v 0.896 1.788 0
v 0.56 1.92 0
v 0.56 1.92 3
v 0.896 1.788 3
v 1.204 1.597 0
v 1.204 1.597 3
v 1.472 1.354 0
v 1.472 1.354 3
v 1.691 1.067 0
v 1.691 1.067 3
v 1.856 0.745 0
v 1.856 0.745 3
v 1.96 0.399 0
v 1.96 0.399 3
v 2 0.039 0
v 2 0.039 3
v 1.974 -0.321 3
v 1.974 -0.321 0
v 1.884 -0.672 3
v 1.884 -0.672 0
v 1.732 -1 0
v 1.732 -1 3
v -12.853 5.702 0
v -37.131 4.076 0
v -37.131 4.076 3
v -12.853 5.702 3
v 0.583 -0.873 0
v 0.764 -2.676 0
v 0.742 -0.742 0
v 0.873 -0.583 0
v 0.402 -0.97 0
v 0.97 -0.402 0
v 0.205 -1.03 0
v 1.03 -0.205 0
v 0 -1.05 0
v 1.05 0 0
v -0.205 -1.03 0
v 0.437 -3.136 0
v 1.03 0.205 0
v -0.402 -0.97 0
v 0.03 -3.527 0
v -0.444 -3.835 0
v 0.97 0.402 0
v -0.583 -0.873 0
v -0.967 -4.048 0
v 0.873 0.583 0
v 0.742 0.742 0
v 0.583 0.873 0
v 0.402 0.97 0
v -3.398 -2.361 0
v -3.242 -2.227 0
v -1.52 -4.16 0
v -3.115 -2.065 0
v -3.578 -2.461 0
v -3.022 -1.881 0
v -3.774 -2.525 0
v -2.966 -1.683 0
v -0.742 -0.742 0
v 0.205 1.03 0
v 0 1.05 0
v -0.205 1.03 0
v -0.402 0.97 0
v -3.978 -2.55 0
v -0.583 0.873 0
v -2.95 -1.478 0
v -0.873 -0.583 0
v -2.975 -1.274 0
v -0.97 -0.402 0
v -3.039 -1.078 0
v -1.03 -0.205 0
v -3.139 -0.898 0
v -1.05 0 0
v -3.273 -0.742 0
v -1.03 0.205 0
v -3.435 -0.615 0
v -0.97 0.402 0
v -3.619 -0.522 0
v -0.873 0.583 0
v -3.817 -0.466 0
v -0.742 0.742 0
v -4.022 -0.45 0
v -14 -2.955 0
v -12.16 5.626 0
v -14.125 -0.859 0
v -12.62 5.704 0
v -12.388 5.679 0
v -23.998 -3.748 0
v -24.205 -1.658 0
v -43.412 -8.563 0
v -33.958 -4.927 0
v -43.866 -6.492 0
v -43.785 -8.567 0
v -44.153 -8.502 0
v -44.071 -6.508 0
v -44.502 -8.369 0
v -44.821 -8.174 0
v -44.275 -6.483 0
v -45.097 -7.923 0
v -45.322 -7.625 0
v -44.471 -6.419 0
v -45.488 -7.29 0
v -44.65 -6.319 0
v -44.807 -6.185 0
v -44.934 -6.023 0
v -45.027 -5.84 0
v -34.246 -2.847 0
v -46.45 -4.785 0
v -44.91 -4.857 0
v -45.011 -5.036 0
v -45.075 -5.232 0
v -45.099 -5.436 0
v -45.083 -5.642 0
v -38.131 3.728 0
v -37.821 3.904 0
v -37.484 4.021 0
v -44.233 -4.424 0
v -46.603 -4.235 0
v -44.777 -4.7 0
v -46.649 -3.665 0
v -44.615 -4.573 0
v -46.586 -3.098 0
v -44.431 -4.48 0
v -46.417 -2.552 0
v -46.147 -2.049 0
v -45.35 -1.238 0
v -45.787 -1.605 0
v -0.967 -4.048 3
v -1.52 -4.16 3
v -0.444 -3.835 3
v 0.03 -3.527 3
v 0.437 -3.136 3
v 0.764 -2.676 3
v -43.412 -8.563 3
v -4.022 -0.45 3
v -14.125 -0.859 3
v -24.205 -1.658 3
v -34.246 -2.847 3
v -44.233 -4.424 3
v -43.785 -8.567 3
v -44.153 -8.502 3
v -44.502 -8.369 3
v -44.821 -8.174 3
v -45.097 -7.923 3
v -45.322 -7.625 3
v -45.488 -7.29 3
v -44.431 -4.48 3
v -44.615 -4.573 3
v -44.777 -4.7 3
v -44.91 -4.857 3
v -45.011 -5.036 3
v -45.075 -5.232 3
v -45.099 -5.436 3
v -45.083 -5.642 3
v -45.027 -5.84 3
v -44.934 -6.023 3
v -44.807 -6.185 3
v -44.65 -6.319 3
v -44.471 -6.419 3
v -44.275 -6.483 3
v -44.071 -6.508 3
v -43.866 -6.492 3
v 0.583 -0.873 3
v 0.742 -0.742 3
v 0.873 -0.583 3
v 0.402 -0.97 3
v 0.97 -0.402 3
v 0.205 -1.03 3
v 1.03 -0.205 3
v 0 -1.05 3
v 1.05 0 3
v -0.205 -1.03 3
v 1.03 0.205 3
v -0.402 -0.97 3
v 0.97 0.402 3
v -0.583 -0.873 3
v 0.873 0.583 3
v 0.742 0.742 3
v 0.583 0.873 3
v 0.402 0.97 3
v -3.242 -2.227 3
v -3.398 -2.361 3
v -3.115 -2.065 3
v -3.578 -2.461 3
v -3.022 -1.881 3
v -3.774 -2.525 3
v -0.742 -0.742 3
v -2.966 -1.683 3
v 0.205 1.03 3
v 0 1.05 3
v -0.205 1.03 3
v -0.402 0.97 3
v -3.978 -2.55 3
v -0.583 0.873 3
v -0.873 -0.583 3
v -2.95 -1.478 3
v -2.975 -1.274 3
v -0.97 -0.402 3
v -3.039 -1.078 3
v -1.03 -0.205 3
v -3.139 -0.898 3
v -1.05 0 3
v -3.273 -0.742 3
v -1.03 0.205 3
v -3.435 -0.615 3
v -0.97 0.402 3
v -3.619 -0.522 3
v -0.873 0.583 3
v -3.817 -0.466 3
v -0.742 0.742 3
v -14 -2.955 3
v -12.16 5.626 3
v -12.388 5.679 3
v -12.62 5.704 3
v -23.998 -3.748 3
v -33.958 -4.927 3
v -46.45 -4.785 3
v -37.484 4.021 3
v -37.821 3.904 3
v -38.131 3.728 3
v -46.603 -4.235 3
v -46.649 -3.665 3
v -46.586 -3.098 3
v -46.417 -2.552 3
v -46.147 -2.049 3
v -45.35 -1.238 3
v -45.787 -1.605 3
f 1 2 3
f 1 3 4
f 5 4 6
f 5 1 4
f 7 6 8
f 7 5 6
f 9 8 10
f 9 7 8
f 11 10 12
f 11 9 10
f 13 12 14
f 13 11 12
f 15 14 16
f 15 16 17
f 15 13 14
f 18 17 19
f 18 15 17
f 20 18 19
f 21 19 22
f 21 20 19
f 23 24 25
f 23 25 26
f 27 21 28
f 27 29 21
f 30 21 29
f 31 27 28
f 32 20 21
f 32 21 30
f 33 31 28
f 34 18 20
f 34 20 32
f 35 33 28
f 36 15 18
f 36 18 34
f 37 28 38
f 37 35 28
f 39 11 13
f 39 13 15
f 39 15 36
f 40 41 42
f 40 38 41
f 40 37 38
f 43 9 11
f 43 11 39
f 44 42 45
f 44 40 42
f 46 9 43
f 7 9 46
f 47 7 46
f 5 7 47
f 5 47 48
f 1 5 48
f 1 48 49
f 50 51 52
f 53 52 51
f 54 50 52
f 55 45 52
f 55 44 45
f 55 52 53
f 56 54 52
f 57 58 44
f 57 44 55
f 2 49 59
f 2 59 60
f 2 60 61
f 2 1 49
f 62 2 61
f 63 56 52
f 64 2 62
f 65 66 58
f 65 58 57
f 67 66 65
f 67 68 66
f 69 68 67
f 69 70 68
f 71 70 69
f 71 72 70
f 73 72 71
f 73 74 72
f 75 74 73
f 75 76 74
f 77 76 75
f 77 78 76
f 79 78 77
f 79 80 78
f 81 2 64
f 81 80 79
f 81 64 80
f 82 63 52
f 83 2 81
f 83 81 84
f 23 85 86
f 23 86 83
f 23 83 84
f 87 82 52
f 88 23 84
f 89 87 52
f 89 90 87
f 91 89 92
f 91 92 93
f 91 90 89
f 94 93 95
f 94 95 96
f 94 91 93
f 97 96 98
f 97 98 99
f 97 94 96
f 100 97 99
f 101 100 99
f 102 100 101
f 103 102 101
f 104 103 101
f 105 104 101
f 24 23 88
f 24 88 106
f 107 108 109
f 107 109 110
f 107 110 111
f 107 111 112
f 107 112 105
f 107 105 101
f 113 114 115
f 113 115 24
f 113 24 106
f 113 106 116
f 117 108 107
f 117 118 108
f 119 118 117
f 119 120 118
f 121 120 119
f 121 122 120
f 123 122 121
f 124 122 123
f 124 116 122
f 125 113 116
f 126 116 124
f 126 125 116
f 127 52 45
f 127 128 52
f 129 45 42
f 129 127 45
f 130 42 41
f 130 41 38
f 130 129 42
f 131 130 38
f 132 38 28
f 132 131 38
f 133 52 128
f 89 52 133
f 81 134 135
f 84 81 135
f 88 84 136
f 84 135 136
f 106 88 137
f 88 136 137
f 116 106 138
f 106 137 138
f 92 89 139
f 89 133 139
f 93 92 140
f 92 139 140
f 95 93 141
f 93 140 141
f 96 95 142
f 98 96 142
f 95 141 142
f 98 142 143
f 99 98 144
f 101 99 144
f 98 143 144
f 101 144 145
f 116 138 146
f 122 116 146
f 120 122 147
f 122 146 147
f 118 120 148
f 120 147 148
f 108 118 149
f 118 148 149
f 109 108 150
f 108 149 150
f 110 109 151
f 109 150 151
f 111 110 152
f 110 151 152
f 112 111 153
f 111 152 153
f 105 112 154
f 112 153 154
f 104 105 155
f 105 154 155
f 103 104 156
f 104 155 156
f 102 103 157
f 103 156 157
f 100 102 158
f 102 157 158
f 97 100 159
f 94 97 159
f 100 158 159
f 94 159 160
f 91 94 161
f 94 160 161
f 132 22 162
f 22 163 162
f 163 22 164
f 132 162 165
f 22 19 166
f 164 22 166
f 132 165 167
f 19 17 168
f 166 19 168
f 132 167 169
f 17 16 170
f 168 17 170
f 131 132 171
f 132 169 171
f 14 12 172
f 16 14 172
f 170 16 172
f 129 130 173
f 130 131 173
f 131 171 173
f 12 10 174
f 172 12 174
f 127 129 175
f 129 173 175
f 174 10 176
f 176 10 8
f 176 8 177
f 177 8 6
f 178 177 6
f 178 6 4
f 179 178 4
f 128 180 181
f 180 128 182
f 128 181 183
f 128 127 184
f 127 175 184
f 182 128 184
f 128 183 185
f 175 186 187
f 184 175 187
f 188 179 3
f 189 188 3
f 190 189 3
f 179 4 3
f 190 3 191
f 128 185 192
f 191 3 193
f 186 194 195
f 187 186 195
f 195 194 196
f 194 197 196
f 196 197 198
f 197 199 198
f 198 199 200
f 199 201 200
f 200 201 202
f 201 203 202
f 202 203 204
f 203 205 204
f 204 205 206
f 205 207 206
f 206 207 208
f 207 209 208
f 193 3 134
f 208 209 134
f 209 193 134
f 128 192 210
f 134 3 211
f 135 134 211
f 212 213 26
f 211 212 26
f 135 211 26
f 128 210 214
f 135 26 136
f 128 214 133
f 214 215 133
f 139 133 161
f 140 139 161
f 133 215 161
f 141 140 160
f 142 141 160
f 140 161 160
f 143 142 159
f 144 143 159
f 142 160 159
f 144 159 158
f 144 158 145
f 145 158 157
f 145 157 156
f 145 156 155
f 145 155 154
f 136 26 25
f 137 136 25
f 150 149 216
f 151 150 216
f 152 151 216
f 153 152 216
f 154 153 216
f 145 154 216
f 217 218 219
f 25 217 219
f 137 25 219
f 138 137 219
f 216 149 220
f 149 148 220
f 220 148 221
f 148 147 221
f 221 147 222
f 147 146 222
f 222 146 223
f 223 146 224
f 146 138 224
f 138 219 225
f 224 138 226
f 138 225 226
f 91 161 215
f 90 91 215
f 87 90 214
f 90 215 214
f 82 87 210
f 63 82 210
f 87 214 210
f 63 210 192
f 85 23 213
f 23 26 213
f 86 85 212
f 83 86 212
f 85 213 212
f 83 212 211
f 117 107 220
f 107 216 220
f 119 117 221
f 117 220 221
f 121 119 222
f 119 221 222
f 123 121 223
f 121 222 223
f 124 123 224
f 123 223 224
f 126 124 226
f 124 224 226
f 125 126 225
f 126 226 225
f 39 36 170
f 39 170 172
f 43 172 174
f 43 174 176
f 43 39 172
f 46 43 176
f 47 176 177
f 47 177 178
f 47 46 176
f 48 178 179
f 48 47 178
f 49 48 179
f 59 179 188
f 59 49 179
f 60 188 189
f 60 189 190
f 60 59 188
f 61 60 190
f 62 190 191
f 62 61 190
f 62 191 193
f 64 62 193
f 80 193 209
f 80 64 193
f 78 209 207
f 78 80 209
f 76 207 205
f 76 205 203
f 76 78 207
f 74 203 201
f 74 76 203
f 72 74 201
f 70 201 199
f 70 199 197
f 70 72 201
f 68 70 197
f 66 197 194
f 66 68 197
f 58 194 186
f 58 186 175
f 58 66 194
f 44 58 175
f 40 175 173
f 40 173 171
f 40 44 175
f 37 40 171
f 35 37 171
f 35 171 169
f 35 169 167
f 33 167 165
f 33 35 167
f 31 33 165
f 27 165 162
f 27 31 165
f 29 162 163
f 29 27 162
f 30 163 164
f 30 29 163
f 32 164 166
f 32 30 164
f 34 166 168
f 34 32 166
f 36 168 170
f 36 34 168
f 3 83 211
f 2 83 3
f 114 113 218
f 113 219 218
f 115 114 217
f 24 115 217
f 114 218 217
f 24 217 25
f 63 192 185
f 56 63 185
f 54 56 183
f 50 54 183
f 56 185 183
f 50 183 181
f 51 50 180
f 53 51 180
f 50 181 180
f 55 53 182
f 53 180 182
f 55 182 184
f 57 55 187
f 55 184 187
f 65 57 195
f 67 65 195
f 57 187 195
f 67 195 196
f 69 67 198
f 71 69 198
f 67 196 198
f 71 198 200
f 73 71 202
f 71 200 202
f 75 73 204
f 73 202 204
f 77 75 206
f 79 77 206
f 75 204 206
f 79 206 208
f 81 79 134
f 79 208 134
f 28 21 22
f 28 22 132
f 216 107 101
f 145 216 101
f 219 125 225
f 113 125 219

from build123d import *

# Parameters (mm, degrees)
SKETCH_1_R                 = 1.05
EXTRUDE_1_DEPTH            = 3
CUT_EXTRUDE_1_DEPTH        = 3
EXTRUDE_2_DEPTH            = 3
CUT_EXTRUDE_1_2_DEPTH      = 53.507202205
CUT_EXTRUDE_1_2_DEPTH_BACK = 3
FILLET_1_R                 = 2
FILLET_2_R                 = 3
FILLET_3_R                 = 3
FILLET_4_R                 = 2


with BuildPart() as part:
    # 草图1 → 凸台-拉伸1 (new body)
    with BuildSketch(Plane.XY):
        with BuildLine():
            Line((-49.8, -9.234190916), (-51.601705413, -5.540147386))
            Line((-51.601705413, -5.540147386), (-37.679104802, 4.039580805))
            Line((-37.679104802, 4.039580805), (-12.5, 5.72552912))
            Line((-12.5, 5.72552912), (0.559507092, 1.920143696))
            ThreePointArc((0.559507092, 1.920143696), (1.855968535, 0.745238752), (1.732050808, -1))
            Line((1.732050808, -1), (0, -4))
            Line((0, -4), (-49.8, -9.234190916))
        make_face()
        Circle(SKETCH_1_R, mode=Mode.SUBTRACT)
    extrude(amount=EXTRUDE_1_DEPTH)

    # 草图3 → Cut-Extrude 1 (cut)
    with BuildSketch(Plane.XY.offset(3)):
        with BuildLine():
            ThreePointArc((-4.02208158, -0.450232214), (-25.702985996, -1.810356042), (-47.195735426, -4.968405291))
            ThreePointArc((-47.195735426, -4.968405291), (-48.031594709, -6.195735426), (-46.804264574, -7.031594709))
            ThreePointArc((-46.804264574, -7.031594709), (-25.48441219, -3.898950185), (-3.97791842, -2.549767786))
            ThreePointArc((-3.97791842, -2.549767786), (-2.950232214, -1.47791842), (-4.02208158, -0.450232214))
        make_face()
    extrude(amount=-CUT_EXTRUDE_1_DEPTH, mode=Mode.SUBTRACT)

    # 草图5 → 凸台-拉伸2 (add)
    with BuildSketch(Plane.XY.offset(3)):
        with BuildLine():
            ThreePointArc((-44.233228768, -4.423985056), (-45.083193675, -5.64158912), (-43.865589611, -6.491554028))
            ThreePointArc((-43.865589611, -6.491554028), (-45.335706004, -6.757335859), (-46.804264574, -7.031594709))
            ThreePointArc((-46.804264574, -7.031594709), (-48.031594709, -6.195735426), (-47.195735426, -4.968405291))
            ThreePointArc((-47.195735426, -4.968405291), (-45.715267325, -4.691922292), (-44.233228768, -4.423985056))
        make_face()
    extrude(amount=-EXTRUDE_2_DEPTH)

    # 草图6 → Cut-Extrude 1 2 (cut, two sides: drawn at the far end of the back side and taken through both)
    with BuildSketch(Plane.XY.offset(3).offset(-CUT_EXTRUDE_1_2_DEPTH_BACK)):
        Polygon((-47.297047091, -2.578239778), (-44.938218964, -8.723197138), (-54.274023229, -12.306876634), (-56.632851356, -6.161919273), align=None)
    extrude(amount=CUT_EXTRUDE_1_2_DEPTH + CUT_EXTRUDE_1_2_DEPTH_BACK, mode=Mode.SUBTRACT)

    # 圆角1
    fillet_1_edges = [part.edges().sort_by_distance(p)[0] for p in [
        (-44.938218964, -8.723197138, 1.5),
    ]]
    fillet(fillet_1_edges, radius=FILLET_1_R)

    # 圆角2
    fillet_2_edges = [part.edges().sort_by_distance(p)[0] for p in [
        (0, -4, 1.5),
    ]]
    fillet(fillet_2_edges, radius=FILLET_2_R)

    # 圆角3
    fillet_3_edges = [part.edges().sort_by_distance(p)[0] for p in [
        (-47.297047091, -2.578239778, 1.5),
    ]]
    fillet(fillet_3_edges, radius=FILLET_3_R)

    # 圆角4
    fillet_4_edges = [part.edges().sort_by_distance(p)[0] for p in [
        (-12.5, 5.72552912, 1.5),
        (-37.679104802, 4.039580805, 1.5),
    ]]
    fillet(fillet_4_edges, radius=FILLET_4_R)


solid = part.part
